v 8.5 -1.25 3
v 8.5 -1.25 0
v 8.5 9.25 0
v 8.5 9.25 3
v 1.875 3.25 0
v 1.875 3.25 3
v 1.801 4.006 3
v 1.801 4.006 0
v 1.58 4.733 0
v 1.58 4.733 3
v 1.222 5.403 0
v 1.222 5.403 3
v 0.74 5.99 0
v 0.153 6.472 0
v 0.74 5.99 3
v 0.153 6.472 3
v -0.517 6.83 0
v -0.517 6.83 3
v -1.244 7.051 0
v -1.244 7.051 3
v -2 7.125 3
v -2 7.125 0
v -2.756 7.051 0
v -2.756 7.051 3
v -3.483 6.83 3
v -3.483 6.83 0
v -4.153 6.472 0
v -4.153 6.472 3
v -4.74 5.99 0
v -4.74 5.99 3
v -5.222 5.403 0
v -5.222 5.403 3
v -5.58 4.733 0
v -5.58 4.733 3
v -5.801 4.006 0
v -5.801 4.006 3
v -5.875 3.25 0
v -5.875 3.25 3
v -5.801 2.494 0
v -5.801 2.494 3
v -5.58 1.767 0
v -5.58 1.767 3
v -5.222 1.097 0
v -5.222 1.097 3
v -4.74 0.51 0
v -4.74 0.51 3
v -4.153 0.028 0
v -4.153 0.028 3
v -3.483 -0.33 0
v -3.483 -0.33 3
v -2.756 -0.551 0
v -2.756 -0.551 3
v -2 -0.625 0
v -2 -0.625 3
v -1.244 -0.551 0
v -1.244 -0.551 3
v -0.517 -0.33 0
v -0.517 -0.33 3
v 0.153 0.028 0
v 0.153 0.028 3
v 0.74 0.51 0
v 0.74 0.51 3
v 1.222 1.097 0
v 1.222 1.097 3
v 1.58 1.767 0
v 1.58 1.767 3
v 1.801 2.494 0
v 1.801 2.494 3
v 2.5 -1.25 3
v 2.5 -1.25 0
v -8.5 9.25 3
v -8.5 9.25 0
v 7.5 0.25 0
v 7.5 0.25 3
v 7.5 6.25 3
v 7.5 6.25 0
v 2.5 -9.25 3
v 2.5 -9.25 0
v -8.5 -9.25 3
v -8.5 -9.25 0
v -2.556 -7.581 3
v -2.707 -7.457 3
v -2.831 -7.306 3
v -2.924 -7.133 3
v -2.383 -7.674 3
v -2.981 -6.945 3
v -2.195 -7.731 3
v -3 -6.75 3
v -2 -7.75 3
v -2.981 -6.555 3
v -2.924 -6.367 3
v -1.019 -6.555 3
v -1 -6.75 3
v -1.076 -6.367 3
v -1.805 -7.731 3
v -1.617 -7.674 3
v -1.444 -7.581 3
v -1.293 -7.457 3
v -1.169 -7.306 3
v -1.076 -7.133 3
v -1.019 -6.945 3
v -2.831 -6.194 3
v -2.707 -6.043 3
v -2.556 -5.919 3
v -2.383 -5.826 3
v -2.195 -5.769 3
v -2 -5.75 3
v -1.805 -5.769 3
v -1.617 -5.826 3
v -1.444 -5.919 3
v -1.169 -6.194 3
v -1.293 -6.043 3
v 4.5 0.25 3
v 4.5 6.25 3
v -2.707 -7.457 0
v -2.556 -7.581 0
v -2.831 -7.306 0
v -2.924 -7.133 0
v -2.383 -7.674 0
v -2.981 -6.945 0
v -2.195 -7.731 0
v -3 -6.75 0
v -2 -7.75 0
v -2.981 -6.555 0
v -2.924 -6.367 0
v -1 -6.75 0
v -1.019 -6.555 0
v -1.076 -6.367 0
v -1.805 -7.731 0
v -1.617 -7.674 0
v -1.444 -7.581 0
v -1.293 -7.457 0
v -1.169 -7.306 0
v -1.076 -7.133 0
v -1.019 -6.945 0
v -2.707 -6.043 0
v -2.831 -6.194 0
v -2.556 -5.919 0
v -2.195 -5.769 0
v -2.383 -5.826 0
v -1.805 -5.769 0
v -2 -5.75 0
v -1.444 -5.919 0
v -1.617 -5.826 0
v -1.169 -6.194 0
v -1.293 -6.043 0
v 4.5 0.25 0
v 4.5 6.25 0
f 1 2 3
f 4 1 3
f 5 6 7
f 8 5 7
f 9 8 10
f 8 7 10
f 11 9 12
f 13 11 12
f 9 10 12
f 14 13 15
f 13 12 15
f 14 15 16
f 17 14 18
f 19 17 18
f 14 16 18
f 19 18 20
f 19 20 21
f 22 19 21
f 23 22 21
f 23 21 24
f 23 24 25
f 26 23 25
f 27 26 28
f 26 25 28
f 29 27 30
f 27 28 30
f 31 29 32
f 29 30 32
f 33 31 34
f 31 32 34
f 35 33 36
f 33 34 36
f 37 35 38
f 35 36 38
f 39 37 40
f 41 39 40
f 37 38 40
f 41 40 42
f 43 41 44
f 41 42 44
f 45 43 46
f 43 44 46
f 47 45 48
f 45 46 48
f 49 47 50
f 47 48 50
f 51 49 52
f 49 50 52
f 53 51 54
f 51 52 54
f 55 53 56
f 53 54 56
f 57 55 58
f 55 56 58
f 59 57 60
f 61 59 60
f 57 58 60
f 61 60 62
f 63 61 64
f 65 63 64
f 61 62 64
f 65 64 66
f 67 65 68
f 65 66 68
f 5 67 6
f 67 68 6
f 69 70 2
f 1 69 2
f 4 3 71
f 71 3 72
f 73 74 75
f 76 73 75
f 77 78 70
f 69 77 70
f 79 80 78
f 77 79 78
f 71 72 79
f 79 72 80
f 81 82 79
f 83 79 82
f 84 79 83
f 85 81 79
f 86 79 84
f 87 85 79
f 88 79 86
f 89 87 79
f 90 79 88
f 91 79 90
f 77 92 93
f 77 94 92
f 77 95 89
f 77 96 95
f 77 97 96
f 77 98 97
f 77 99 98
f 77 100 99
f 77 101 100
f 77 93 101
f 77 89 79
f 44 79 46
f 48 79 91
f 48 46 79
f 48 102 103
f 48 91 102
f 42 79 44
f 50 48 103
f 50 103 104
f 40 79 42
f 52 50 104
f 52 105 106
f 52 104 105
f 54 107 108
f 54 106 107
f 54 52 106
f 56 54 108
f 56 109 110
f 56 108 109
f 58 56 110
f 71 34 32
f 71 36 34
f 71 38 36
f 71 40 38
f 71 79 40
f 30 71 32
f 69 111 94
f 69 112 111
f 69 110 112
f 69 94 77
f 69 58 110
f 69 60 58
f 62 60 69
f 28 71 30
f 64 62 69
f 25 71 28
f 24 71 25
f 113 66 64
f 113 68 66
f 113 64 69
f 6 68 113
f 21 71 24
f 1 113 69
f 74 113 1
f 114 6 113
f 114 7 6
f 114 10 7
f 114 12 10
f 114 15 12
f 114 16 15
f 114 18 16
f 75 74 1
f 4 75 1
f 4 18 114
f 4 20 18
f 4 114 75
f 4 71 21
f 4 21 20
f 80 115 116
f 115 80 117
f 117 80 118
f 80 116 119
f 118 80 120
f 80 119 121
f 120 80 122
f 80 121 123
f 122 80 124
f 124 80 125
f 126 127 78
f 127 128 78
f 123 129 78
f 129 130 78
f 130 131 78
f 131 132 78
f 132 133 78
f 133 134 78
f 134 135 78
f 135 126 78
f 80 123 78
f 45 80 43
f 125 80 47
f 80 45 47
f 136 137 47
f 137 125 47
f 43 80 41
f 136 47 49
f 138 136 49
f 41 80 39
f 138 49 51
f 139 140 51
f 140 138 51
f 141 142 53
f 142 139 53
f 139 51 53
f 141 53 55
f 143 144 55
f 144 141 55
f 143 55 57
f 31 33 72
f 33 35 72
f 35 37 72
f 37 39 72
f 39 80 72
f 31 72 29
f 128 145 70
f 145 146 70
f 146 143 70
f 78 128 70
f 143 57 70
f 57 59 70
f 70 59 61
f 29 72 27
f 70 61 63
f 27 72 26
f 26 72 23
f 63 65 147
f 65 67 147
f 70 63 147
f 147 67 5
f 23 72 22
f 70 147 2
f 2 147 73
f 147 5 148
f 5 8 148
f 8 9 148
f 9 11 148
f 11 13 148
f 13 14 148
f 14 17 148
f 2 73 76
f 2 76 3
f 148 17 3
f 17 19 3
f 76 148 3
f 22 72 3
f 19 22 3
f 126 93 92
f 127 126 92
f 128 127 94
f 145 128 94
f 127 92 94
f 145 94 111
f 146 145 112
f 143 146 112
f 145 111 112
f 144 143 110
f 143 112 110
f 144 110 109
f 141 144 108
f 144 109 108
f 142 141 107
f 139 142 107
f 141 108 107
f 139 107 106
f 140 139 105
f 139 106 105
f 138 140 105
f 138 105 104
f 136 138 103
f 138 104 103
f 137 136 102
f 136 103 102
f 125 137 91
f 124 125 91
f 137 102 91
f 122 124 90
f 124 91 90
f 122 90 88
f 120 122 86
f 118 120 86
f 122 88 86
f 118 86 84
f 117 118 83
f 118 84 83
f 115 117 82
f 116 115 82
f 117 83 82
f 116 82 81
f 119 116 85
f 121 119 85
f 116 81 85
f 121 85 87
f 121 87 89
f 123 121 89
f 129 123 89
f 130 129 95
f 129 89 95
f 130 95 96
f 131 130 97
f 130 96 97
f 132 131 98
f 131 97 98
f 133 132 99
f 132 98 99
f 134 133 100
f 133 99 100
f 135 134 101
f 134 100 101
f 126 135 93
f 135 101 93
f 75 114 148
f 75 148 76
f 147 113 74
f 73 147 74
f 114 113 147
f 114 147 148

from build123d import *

# Parameters (mm, degrees)
BOSS_EXTRUDE3_DEPTH = 3
SKETCH6_W           = 3
SKETCH6_H           = 6
CUT_EXTRUDE2_DEPTH  = 3
SKETCH7_R           = 3.875
SKETCH7_R_2         = 1
CUT_EXTRUDE3_DEPTH  = 3


with BuildPart() as part:
    # Sketch3 → Boss-Extrude3 (new body)
    with BuildSketch(Plane.XY):
        Polygon((2.5, -9.25), (2.5, -1.25), (8.5, -1.25), (8.5, 9.25), (-8.5, 9.25), (-8.5, -9.25), align=None)
    extrude(amount=BOSS_EXTRUDE3_DEPTH)

    # Sketch6 → Cut-Extrude2 (cut)
    with BuildSketch(Plane.XY.offset(3)):
        with Locations((6, 3.25)):
            Rectangle(SKETCH6_W, SKETCH6_H)
    extrude(amount=-CUT_EXTRUDE2_DEPTH, mode=Mode.SUBTRACT)

    # Sketch7 → Cut-Extrude3 (cut)
    with BuildSketch(Plane.XY.offset(3)):
        with Locations((-2, 3.25)):
            Circle(SKETCH7_R)
        with Locations((-2, -6.75)):
            Circle(SKETCH7_R_2)
    extrude(amount=-CUT_EXTRUDE3_DEPTH, mode=Mode.SUBTRACT)


solid = part.part
